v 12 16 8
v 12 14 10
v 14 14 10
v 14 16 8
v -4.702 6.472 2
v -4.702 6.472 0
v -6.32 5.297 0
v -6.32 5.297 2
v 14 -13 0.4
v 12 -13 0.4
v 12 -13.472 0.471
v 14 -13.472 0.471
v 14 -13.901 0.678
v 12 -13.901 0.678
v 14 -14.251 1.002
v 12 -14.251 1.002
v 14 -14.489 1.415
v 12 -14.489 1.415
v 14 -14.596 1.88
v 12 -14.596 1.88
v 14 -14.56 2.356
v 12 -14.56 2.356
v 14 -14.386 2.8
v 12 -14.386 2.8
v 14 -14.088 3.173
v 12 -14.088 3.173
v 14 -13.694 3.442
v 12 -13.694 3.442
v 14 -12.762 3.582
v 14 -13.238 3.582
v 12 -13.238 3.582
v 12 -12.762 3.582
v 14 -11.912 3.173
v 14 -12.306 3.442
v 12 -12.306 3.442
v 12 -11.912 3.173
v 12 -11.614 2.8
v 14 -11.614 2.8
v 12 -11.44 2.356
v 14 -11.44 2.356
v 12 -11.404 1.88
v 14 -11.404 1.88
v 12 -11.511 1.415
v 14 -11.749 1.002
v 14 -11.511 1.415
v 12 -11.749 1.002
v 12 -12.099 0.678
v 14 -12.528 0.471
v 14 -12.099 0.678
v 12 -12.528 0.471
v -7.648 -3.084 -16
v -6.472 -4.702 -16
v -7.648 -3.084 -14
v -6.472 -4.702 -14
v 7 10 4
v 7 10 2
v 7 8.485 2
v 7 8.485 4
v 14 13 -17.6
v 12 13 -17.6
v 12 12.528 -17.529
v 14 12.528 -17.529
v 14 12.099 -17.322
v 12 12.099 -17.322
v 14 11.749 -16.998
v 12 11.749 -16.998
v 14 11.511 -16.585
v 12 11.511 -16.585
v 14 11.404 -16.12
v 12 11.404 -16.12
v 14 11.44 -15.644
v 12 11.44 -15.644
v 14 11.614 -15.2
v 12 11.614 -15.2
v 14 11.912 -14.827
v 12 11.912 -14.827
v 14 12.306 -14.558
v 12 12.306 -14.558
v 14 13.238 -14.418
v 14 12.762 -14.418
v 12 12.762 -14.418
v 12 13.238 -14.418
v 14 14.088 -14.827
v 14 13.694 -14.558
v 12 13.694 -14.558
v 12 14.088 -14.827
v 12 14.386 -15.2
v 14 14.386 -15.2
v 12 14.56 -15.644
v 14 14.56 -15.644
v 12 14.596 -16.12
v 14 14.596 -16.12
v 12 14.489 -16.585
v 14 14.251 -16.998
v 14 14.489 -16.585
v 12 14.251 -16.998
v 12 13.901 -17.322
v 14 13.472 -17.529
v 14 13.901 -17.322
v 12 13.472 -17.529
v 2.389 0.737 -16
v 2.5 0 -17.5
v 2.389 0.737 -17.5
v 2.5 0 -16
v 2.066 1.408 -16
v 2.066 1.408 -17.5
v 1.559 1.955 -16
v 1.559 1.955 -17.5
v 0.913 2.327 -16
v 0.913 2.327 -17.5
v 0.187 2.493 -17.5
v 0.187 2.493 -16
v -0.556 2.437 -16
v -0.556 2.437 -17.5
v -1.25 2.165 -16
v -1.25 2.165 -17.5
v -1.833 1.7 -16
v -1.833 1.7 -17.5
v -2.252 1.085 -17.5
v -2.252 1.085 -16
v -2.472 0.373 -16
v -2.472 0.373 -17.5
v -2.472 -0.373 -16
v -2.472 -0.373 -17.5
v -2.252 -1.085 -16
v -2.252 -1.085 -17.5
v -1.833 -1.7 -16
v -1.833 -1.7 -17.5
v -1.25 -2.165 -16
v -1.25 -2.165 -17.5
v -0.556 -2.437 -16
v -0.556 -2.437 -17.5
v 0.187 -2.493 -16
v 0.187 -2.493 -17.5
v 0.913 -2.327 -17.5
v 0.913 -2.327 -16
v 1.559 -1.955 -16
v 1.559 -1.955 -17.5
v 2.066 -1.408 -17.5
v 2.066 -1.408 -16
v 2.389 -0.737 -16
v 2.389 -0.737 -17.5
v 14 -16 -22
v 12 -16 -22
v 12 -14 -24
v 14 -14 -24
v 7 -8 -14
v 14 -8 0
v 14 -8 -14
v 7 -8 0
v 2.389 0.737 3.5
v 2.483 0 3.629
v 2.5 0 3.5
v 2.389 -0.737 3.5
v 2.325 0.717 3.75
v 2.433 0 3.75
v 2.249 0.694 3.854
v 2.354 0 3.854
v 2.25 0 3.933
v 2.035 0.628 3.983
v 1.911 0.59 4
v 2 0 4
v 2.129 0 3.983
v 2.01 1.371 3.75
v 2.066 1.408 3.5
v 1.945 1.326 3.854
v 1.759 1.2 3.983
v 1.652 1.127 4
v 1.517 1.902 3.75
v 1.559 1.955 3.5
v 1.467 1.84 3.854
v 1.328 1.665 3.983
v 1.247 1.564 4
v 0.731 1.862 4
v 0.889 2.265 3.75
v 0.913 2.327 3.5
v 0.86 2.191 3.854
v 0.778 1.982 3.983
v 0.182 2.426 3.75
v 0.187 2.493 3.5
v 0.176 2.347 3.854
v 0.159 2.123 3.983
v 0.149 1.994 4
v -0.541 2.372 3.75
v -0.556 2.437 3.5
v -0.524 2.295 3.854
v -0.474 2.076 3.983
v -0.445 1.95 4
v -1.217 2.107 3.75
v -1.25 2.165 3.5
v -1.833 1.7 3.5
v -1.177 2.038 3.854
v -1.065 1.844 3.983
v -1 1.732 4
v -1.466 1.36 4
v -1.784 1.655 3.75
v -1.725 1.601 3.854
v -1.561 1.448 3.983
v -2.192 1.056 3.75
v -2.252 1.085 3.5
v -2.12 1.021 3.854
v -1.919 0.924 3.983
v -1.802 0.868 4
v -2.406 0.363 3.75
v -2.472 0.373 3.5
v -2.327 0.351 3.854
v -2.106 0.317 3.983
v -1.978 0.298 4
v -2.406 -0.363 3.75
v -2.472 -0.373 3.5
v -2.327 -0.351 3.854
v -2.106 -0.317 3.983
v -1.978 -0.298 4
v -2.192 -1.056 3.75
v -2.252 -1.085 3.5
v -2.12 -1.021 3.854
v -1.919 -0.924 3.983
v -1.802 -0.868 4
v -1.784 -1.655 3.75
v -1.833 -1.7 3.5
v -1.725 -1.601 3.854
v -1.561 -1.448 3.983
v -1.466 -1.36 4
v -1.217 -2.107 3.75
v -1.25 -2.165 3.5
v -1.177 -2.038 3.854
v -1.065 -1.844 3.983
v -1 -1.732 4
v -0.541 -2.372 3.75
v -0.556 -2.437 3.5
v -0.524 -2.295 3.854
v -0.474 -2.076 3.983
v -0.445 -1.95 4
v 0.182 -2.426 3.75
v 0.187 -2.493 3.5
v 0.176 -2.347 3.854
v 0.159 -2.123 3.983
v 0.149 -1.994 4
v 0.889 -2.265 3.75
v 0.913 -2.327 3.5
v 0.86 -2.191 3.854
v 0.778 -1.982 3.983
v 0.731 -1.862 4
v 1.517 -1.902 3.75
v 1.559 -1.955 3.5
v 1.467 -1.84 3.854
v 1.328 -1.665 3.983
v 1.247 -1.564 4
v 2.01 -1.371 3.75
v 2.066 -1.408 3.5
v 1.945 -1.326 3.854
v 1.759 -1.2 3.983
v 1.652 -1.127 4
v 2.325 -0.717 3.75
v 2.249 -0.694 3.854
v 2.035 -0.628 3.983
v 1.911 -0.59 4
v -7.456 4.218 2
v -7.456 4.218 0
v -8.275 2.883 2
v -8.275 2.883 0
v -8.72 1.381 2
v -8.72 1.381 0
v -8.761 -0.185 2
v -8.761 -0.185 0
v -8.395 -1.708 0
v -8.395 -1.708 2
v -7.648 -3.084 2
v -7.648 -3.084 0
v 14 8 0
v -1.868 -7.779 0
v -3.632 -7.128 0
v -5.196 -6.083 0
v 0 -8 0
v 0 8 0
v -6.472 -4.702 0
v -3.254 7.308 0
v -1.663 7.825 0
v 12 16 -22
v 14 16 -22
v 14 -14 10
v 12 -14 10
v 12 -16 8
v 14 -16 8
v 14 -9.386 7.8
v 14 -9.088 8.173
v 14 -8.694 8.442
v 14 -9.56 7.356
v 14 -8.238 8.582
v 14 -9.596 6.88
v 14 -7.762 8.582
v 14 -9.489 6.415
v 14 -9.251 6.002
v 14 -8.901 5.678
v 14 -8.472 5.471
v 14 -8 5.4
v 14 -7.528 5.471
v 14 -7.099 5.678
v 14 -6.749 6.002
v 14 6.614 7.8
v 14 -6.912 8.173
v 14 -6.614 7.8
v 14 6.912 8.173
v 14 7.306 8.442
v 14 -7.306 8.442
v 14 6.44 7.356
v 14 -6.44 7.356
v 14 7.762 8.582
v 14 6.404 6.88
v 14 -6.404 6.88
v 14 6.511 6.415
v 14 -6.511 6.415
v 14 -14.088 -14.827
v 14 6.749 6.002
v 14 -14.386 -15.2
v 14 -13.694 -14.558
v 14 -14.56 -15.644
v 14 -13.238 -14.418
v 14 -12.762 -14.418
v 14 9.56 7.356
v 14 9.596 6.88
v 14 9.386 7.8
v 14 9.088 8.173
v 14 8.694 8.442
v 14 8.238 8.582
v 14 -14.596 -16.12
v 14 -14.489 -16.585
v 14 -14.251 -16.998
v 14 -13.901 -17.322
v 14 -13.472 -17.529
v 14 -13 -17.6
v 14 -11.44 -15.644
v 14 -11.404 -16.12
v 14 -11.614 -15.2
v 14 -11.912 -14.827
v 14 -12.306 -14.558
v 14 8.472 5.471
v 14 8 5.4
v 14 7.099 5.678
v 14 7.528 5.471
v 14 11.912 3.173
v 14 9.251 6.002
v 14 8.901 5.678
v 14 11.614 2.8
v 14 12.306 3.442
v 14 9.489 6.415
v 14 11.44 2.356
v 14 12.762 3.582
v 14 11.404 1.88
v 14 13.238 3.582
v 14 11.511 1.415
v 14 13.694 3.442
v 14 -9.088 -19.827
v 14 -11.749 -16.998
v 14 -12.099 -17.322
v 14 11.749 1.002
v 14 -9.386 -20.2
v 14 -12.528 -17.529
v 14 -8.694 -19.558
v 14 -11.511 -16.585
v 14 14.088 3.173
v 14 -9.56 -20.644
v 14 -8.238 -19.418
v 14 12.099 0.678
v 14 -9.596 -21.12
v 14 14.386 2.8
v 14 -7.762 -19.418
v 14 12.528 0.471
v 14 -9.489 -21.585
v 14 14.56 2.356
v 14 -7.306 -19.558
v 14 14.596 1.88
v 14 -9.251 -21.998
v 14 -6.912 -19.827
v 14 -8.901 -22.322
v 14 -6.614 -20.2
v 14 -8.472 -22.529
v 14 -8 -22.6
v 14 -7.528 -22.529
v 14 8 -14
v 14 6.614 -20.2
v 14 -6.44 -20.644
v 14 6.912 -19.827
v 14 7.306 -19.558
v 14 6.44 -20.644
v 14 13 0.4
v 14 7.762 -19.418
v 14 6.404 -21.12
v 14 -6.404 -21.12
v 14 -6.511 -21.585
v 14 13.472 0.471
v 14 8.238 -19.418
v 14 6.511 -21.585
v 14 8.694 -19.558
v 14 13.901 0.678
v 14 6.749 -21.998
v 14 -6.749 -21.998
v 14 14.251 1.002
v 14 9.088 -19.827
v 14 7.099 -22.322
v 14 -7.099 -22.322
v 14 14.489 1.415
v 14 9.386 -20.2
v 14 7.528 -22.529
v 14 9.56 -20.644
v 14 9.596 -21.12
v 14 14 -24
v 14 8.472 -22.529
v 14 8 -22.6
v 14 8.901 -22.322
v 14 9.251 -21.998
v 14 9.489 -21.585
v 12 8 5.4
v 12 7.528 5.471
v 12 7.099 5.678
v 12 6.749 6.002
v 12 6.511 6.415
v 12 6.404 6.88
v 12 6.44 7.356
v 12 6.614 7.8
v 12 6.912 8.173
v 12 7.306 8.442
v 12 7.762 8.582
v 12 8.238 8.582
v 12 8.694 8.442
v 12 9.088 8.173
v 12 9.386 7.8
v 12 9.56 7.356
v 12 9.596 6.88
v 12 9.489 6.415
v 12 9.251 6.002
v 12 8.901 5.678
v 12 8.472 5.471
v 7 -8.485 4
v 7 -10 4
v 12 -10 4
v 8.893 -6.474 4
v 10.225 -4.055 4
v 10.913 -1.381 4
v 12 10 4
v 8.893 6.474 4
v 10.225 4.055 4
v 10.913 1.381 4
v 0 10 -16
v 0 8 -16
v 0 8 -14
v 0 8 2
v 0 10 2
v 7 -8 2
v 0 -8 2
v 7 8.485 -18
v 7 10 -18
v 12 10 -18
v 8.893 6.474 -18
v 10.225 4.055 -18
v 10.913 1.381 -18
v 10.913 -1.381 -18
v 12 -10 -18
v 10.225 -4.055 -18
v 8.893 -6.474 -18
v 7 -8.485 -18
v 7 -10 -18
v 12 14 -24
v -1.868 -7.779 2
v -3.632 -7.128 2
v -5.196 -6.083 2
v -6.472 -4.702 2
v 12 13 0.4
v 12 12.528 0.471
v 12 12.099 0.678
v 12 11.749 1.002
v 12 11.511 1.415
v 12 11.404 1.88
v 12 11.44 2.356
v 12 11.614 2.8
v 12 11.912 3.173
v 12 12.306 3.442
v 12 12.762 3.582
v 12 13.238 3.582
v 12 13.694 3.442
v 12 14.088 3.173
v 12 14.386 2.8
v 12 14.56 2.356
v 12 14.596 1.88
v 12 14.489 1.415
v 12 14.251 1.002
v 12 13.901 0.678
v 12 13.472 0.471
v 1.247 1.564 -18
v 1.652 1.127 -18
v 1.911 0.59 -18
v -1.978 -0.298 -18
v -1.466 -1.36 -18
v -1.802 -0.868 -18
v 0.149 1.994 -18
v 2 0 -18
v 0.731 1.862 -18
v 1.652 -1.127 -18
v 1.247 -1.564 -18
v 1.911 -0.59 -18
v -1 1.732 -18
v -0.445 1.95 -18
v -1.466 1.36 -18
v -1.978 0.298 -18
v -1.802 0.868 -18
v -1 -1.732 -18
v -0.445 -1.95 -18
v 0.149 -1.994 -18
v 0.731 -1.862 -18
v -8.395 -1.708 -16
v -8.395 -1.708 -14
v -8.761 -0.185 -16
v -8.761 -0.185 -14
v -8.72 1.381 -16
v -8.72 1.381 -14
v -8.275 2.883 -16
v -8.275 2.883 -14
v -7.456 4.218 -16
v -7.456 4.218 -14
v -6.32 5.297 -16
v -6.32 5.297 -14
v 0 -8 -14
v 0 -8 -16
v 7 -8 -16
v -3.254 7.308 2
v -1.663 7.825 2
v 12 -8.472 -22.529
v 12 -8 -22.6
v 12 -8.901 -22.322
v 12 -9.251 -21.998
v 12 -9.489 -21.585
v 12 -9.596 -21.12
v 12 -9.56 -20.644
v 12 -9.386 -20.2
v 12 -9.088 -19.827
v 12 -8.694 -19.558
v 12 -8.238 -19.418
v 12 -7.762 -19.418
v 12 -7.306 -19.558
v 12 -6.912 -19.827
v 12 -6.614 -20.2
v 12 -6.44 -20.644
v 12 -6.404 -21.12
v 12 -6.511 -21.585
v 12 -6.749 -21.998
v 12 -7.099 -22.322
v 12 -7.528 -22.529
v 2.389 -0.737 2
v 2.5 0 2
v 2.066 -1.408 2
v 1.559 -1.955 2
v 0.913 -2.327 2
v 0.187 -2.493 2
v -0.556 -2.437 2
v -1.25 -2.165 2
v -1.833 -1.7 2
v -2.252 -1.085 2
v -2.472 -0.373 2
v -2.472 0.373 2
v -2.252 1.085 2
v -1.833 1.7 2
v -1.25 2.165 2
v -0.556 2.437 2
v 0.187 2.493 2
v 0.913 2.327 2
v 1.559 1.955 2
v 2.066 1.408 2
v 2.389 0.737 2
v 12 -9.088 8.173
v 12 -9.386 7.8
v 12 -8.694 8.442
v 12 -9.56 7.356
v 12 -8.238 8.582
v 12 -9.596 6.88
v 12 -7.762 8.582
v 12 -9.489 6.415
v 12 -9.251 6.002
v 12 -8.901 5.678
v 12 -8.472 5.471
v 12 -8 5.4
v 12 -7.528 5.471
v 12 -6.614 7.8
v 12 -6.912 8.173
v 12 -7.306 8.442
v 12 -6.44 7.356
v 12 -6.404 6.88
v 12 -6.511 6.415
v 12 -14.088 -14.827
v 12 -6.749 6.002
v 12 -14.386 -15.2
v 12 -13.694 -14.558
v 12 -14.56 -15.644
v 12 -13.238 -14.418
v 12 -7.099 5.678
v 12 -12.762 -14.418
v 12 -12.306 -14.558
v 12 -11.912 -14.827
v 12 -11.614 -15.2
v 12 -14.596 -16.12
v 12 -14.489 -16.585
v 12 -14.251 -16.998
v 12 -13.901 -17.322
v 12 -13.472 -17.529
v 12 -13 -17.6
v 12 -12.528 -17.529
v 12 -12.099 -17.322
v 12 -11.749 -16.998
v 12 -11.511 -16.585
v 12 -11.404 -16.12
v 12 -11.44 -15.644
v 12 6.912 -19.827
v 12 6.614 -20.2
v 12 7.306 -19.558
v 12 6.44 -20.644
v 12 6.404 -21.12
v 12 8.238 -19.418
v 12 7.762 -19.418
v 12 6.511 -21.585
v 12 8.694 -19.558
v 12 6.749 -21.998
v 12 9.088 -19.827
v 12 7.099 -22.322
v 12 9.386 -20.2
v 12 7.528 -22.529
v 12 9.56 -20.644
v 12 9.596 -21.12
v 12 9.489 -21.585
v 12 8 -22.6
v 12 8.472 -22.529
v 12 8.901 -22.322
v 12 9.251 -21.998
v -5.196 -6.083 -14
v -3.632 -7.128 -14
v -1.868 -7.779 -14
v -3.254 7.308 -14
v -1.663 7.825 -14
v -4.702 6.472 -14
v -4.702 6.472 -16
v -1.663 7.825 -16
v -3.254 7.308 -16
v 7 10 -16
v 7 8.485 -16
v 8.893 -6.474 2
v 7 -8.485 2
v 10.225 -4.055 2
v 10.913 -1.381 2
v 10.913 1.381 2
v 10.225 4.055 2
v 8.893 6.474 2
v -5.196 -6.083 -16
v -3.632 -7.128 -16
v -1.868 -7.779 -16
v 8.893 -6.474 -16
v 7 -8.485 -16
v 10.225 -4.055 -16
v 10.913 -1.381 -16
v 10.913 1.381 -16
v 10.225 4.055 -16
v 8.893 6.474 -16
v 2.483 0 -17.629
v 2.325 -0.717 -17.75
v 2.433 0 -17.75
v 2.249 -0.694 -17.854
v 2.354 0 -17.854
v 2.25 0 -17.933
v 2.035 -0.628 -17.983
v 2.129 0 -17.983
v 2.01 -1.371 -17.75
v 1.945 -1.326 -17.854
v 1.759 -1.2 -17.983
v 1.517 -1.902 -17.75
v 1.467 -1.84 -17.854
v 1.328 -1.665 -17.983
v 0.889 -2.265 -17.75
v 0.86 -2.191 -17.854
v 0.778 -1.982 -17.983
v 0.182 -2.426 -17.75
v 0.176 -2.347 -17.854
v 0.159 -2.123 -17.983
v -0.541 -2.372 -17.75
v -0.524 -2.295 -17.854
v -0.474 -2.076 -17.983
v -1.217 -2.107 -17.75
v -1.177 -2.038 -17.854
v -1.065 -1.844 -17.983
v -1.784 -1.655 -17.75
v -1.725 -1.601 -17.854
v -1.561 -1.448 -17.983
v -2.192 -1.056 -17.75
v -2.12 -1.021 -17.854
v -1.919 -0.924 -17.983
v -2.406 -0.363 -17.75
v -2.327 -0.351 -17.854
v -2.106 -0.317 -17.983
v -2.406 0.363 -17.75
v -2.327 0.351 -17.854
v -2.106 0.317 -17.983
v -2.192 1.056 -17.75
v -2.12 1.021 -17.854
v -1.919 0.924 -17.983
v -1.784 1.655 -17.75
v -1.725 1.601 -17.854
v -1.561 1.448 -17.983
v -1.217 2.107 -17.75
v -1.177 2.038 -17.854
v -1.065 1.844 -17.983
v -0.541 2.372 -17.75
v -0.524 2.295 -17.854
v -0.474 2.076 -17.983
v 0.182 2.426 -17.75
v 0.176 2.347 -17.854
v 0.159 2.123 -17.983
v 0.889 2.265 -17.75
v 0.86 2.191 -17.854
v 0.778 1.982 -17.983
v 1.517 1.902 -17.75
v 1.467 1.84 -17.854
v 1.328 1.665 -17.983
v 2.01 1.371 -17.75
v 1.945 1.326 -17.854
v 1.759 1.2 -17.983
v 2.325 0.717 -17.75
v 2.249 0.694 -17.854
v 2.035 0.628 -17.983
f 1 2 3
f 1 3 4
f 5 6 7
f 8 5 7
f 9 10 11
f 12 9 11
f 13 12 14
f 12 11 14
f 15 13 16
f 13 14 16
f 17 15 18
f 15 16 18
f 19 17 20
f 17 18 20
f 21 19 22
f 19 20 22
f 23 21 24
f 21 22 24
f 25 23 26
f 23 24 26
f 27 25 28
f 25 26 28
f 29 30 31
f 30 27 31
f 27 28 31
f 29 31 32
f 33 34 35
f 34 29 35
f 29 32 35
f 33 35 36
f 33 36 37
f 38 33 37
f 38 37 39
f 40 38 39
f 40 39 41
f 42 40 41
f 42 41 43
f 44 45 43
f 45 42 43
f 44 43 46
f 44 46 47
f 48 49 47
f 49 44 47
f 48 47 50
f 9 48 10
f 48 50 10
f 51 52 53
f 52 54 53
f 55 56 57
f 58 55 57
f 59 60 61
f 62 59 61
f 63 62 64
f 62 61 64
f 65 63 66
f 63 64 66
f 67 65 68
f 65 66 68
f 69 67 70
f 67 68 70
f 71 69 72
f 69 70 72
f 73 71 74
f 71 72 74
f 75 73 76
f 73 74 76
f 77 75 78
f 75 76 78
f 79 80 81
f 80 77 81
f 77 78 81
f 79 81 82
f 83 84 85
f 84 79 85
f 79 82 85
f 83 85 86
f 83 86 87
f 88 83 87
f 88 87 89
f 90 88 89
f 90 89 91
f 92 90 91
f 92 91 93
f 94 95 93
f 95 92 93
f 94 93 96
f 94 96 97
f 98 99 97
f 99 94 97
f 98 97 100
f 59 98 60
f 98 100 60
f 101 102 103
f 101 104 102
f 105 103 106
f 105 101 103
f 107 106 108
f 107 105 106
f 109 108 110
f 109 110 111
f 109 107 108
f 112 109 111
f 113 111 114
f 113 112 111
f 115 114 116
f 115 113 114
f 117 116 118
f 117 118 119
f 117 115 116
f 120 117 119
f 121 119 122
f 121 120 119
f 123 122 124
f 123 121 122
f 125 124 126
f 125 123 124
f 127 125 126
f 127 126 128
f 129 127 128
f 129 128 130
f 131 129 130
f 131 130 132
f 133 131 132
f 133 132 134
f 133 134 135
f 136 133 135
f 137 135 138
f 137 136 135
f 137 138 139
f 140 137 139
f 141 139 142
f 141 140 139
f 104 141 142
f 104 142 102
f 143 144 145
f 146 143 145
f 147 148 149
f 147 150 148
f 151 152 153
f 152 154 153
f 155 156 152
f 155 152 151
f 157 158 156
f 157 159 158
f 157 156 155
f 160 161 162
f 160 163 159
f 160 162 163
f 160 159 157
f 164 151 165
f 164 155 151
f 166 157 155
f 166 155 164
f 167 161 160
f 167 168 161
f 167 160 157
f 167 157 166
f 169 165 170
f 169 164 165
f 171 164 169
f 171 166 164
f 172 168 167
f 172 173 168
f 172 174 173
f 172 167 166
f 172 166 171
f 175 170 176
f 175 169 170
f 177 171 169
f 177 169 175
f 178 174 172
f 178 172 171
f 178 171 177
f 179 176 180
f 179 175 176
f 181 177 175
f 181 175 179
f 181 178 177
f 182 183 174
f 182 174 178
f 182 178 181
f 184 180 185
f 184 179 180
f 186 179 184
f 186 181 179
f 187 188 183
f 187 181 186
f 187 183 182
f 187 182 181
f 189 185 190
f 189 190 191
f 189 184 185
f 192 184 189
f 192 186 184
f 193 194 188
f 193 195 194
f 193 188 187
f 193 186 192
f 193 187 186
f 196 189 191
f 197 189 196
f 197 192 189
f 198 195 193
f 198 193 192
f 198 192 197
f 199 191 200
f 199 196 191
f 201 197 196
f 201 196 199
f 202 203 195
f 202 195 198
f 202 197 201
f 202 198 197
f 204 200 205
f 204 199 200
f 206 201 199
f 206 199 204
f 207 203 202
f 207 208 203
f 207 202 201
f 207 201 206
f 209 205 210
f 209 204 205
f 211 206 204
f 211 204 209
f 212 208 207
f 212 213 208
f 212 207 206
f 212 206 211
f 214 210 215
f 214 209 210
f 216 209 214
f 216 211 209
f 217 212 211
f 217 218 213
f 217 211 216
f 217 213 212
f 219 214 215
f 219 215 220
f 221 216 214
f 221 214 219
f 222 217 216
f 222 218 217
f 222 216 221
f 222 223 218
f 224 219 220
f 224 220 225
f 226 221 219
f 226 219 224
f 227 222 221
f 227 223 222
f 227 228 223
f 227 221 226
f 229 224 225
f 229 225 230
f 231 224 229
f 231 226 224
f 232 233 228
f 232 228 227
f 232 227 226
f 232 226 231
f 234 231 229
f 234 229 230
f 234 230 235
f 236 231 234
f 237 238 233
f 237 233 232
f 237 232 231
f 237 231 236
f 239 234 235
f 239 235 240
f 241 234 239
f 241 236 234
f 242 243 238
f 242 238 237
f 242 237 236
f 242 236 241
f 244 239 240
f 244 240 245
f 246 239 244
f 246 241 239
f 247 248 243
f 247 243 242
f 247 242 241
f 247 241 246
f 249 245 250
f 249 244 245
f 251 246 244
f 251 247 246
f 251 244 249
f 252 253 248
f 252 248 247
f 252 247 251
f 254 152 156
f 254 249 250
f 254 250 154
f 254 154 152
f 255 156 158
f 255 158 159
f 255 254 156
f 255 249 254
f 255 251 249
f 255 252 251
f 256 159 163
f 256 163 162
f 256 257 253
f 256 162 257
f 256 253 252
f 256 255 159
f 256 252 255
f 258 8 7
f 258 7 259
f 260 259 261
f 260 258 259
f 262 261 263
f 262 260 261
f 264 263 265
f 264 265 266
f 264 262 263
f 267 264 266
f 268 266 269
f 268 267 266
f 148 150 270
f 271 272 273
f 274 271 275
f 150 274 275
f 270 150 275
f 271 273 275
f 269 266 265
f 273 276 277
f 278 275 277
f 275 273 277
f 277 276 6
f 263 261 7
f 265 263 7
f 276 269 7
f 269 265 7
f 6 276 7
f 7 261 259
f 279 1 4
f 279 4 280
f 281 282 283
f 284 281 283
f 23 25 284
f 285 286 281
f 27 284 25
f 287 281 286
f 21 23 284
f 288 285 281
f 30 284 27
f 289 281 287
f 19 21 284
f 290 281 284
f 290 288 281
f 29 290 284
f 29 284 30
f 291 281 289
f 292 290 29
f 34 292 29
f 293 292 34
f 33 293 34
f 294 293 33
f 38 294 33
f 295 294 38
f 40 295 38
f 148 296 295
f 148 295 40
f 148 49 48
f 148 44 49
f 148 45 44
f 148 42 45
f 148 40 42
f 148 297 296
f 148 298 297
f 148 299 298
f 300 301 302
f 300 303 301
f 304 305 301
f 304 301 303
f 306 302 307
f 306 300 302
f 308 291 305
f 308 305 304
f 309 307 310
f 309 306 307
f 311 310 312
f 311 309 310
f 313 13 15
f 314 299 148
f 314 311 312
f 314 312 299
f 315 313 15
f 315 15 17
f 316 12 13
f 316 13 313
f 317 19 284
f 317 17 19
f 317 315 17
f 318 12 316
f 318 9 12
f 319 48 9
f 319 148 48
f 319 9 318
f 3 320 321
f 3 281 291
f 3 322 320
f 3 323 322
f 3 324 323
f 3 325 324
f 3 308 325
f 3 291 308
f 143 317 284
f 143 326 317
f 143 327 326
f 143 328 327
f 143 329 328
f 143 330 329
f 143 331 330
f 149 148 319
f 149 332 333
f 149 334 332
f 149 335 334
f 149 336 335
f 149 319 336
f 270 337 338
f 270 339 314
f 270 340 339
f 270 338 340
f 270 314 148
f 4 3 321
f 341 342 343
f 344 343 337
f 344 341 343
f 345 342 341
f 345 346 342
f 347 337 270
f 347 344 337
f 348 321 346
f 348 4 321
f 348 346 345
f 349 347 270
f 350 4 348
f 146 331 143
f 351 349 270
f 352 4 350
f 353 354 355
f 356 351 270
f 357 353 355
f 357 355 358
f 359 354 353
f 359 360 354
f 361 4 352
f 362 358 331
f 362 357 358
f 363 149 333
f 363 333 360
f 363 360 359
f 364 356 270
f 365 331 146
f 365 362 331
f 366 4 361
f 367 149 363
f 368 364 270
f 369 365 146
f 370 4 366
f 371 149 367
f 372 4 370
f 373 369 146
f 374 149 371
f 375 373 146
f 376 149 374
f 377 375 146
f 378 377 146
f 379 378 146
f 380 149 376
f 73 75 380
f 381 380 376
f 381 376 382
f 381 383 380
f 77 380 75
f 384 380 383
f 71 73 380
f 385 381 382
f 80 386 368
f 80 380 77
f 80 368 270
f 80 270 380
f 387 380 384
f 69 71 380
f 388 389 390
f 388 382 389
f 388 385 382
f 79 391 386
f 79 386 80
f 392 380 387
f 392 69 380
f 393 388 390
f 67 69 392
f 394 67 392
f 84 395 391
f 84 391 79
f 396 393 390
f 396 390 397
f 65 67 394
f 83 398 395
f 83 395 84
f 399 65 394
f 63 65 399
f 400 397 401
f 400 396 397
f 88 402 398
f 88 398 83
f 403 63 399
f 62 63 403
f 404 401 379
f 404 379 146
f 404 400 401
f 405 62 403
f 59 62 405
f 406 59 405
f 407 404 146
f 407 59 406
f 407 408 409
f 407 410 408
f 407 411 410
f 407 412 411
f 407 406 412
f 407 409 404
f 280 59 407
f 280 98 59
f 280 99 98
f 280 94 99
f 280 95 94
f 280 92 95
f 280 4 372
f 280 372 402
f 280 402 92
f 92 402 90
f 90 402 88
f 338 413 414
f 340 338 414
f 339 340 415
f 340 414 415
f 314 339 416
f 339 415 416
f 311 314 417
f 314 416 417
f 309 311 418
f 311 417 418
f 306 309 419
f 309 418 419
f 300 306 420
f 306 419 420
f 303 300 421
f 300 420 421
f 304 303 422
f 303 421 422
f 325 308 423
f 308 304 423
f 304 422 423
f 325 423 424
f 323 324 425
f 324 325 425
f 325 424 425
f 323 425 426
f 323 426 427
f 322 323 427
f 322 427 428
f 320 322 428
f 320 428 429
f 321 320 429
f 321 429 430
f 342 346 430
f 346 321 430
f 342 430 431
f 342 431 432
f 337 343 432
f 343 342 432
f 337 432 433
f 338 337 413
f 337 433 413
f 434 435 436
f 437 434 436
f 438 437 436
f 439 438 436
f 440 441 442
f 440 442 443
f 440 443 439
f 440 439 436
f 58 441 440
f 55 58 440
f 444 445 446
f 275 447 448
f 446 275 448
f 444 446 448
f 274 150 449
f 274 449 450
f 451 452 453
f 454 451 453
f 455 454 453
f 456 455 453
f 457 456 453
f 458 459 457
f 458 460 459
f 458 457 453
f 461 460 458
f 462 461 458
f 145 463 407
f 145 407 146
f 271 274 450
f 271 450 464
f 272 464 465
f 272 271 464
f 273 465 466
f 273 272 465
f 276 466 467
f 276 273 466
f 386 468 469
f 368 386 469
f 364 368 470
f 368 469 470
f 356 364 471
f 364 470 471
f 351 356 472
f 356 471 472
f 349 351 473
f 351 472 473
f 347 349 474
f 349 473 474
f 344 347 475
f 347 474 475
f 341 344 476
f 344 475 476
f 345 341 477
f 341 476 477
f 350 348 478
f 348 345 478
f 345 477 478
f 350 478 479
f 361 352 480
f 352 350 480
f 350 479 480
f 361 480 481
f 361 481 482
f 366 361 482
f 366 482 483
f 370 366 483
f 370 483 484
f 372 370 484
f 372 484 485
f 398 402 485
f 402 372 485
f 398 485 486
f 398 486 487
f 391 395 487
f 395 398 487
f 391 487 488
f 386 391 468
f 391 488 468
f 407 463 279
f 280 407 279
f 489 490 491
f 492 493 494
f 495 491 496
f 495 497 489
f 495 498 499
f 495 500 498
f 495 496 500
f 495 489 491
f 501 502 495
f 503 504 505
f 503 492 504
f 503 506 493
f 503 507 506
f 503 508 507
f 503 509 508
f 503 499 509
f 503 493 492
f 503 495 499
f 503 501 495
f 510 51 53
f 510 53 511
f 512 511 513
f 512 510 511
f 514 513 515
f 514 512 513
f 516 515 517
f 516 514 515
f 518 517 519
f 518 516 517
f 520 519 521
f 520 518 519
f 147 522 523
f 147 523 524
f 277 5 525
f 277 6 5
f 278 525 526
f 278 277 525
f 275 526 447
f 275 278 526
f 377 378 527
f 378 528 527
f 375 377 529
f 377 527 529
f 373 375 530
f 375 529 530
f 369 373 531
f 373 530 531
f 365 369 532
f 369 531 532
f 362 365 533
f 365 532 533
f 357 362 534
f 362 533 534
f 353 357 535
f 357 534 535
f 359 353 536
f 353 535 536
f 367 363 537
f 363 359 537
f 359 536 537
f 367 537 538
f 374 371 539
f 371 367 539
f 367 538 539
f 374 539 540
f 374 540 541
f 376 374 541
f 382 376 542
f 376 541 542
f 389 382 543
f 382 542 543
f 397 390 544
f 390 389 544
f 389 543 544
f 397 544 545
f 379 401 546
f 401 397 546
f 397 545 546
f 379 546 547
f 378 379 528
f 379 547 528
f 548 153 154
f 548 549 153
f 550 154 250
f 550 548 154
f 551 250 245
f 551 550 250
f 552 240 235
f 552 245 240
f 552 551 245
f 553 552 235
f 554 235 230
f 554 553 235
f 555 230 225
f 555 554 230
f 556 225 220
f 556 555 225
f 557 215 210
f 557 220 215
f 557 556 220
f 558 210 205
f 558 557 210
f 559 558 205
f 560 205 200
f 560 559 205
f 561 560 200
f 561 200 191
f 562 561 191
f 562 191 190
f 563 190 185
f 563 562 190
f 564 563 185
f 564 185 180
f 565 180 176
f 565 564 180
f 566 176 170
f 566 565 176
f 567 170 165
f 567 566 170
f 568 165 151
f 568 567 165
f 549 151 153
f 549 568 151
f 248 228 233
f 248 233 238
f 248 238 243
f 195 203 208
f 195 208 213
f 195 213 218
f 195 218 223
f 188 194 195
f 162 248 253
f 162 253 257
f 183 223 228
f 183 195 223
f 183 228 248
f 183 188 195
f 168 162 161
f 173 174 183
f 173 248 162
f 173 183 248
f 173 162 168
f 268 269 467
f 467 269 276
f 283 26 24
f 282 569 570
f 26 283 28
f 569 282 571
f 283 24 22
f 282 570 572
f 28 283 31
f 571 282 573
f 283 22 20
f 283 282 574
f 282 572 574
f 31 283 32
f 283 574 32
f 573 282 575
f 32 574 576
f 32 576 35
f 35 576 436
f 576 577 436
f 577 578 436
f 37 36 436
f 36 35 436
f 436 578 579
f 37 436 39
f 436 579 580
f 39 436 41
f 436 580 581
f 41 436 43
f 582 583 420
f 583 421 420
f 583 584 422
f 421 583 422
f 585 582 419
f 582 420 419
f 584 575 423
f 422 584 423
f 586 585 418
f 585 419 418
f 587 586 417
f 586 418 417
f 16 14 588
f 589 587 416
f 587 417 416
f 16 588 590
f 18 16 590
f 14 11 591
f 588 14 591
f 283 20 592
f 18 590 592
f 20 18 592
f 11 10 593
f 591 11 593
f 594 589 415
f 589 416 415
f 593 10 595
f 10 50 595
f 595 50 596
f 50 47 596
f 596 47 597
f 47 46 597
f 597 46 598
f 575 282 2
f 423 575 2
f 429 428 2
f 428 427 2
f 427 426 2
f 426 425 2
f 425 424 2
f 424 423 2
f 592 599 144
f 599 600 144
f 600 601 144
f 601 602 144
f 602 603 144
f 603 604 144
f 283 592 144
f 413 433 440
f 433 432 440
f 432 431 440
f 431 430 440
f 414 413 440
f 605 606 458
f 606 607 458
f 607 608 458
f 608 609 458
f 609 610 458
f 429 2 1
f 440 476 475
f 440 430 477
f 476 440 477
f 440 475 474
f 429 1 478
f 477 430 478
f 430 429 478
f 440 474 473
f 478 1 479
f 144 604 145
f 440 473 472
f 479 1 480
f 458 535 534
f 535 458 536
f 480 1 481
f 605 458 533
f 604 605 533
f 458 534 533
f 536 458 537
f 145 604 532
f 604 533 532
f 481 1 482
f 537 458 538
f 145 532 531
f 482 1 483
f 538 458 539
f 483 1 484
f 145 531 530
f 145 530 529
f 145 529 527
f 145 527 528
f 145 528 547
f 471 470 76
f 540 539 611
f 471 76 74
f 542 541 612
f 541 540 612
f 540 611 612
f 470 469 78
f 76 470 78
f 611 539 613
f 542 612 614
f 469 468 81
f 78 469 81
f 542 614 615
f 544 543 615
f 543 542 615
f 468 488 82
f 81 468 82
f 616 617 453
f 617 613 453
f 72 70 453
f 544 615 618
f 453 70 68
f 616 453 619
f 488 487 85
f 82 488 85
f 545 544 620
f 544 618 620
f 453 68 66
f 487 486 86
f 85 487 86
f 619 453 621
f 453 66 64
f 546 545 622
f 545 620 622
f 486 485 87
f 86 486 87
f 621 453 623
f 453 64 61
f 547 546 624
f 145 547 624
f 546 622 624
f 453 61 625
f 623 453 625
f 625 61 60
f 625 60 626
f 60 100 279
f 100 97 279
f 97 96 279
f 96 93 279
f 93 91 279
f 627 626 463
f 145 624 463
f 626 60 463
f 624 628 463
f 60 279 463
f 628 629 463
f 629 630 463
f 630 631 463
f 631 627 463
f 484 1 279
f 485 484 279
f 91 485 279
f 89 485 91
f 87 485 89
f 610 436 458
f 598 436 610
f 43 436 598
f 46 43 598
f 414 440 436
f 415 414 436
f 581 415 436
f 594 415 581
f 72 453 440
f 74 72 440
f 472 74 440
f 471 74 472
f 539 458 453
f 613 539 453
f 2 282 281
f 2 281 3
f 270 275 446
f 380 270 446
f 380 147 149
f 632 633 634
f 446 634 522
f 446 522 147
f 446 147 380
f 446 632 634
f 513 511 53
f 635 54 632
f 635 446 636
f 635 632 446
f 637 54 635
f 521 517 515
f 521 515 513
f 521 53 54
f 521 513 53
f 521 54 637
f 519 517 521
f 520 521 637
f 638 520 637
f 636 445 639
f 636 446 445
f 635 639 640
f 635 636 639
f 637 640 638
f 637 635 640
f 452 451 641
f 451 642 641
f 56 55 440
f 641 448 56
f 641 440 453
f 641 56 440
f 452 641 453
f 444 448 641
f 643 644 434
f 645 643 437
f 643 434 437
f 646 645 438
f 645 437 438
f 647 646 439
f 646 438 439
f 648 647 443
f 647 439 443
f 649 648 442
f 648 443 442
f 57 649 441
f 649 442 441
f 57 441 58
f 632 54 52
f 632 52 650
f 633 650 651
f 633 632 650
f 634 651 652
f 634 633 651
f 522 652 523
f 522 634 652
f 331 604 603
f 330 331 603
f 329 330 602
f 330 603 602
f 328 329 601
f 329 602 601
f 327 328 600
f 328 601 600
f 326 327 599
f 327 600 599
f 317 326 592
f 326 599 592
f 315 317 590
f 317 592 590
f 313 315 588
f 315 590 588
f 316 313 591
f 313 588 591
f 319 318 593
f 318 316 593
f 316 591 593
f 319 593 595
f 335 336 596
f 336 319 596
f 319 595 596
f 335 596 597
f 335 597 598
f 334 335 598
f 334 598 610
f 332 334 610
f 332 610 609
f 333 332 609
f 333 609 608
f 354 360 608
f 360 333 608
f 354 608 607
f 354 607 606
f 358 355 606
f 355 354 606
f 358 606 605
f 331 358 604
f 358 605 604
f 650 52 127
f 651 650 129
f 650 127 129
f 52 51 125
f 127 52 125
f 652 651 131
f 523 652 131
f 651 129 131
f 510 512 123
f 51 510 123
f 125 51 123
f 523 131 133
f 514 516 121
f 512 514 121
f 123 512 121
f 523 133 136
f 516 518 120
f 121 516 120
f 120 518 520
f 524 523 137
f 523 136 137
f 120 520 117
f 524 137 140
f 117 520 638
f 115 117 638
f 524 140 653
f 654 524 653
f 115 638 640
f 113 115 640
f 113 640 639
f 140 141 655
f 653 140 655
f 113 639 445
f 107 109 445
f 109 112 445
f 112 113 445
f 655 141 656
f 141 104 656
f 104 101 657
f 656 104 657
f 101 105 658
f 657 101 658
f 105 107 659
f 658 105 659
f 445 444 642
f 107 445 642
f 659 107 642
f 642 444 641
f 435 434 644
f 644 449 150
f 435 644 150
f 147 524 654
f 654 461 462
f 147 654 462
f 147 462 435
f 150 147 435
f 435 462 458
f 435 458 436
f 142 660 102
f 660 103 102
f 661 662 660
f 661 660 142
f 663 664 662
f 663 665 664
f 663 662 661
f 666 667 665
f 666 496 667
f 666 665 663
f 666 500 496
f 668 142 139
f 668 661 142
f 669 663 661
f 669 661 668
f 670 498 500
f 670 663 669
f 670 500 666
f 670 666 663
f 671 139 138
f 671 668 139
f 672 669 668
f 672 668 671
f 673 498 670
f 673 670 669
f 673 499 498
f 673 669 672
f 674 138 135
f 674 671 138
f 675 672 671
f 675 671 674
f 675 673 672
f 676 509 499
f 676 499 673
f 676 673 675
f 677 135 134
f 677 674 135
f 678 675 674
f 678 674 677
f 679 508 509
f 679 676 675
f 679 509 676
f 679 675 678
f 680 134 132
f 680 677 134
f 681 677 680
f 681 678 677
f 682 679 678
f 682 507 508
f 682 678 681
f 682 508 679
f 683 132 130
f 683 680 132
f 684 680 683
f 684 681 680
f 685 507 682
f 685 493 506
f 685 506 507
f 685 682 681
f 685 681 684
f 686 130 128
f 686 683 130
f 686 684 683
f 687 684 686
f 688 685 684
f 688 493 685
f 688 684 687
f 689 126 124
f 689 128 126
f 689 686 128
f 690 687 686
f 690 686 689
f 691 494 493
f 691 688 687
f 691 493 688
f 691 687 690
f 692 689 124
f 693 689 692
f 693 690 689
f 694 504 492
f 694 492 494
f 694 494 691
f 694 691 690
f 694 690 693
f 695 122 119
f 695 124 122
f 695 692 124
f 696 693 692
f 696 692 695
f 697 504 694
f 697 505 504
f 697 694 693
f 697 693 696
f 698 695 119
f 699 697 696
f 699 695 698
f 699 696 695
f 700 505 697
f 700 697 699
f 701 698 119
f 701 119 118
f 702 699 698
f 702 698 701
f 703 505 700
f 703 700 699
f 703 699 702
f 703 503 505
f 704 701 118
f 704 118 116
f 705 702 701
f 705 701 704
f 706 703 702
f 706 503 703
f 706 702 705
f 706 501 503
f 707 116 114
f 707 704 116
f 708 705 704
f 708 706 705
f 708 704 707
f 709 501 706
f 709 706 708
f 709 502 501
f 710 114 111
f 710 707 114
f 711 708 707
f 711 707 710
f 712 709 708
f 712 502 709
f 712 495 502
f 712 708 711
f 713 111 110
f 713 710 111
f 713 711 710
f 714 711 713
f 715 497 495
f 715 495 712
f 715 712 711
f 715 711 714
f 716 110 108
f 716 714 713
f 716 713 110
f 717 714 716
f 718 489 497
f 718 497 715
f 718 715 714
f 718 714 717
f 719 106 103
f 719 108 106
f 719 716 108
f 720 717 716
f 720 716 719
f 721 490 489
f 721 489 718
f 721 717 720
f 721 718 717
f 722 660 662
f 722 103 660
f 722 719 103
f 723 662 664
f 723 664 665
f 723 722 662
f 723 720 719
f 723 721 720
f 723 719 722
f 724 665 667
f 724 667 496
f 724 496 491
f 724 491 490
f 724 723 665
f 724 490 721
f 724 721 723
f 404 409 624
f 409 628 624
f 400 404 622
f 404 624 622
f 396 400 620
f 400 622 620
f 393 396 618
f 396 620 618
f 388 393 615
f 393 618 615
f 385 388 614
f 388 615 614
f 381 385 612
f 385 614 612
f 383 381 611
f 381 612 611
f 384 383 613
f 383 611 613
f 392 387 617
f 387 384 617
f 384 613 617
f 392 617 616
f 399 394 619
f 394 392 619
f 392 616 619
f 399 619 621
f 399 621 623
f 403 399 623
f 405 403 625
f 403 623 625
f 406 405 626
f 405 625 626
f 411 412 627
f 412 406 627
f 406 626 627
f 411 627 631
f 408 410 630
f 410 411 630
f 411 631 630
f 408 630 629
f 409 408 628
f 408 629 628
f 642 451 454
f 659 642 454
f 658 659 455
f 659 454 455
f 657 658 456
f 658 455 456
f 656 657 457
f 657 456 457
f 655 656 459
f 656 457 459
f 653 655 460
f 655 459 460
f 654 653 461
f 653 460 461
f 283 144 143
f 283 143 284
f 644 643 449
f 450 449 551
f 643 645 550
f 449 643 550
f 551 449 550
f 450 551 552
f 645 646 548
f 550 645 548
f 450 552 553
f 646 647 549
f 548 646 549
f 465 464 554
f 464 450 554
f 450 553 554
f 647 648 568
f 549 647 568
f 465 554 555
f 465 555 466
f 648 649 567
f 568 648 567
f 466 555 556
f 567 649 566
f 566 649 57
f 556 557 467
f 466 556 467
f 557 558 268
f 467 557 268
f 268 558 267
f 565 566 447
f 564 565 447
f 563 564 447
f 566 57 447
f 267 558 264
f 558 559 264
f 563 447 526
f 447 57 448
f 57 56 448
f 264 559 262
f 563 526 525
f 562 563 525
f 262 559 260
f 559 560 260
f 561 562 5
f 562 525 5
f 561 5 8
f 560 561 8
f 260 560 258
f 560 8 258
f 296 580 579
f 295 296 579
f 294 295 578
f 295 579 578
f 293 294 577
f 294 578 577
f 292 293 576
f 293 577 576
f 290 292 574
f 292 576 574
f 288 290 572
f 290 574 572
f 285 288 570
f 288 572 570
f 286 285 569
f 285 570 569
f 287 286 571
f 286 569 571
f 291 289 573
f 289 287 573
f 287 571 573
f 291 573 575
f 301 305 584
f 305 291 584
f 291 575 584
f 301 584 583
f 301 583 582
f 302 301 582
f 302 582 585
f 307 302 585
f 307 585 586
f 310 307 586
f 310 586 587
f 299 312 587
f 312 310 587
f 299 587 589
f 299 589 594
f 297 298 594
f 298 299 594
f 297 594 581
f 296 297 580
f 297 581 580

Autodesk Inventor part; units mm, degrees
ref_plane "YZ Plane" through (0, 0, 0) normal (1, 0, 0) x (0, 1, 0)
sketch "Sketch1" plane through (0, 0, 0) normal (0, 0, 1) x (1, 0, 0)
  circle A0 centre (0, 0) radius 2.5
  circle A1 centre (20, 0) radius 2.5
  line L0 (7, 10) -> (20, 10)
  line L1 (7, -10) -> (20, -10)
  arc A2 (20, -10) -> (20, 10) centre (20, 0) ccw
  line L2 (7, 10) -> (7, 8)
  line L3 (7, -10) -> (7, -8)
  line L4 (7, 8) -> (0, 8)
  line L5 (7, -8) -> (0, -8)
  arc A3 (0, 8) -> (0, -8) centre (0, 0) ccw
  dimension "d0" = 5
  dimension "d1" = 20
  dimension "d2" = 10
  dimension "d3" = 2
  dimension "d4" = 13
extrude "Extrusion1" add sketch "Sketch1" along normal blind 4
sketch "Sketch2" plane through (0, 0, 4) normal (0, 0, 1) x (1, 0, 0)
  circle A0 centre (0, 0) radius 2.5 projected
  line L0 (7, 8) -> (0, 8) projected
  arc A1 (0, 8) -> (0, -8) centre (0, 0) ccw projected
  line L1 (0, -8) -> (7, -8) projected
  line L2 (7, -10) -> (20, -10) projected
  line L3 (7, 8) -> (7, -8)
  line L4 (7, -8) -> (0, -8)
  line L5 (7, 8) -> (0, 8)
  arc A2 (0, 8) -> (0, -8) centre (0, 0) ccw
extrude "Extrusion2" cut sketch "Sketch2" against normal blind 2
sketch "Sketch3" plane through (0, 0, 0) normal (0, 0, -1) x (-1, 0, 0)
  circle A0 centre (-20, 0) radius 2.5 projected
  circle A1 centre (0, 0) radius 2.5 projected
  line L0 (-7, 10) -> (-20, 10) projected
  arc A2 (-20, 10) -> (-20, -10) centre (-20, 0) ccw projected
  line L1 (-20, -10) -> (-7, -10) projected
  line L2 (-7, 8) -> (-7, 10) projected
  line L3 (-19, 10) -> (-19, 8)
  line L4 (-19, 8) -> (-11, 8)
  line L5 (-11, 8) -> (-11, -8)
  line L6 (-11, -8) -> (-19, -8)
  line L7 (-19, -8) -> (-19, -10)
  point P0 (-7, -8)
  dimension "d9" = 1
  dimension "d10" = 11
extrude "Extrusion3" cut sketch "Sketch3" against normal blind 2 contours L3 L4 L5 L6 L7 L1 A2 L0
sketch "Sketch4" plane through (0, 0, 4) normal (0, 0, 1) x (1, 0, 0)
  line L0 (7, 10) -> (7, -10)
  circle A0 centre (0, 0) radius 2.5
  arc A1 (7, -8.485281) -> (7, 8.485281) centre (0, 0) ccw
  dimension "d15" = 11
extrude "Extrusion4" cut sketch "Sketch4" against normal blind 2 contours A1 L0
sketch "Sketch5" plane through (0, 0, 0) normal (0, 0, -1) x (-1, 0, 0)
  line L0 (0, 8) -> (-7, 8) projected
  line L1 (-7, 10) -> (0, 10)
  line L2 (0, 10) -> (0, 8)
  line L3 (0, 8) -> (-7, 8)
  line L4 (-7, 8) -> (-7, 10)
  arc A0 (0, -8) -> (0, 8) centre (0, 0) ccw projected
extrude "Extrusion5" add sketch "Sketch5" against normal blind 2
sketch "Sketch6" plane through (0, 0, 0) normal (0, 0, -1) x (-1, 0, 0)
  line L0 (0, 10) -> (-19, 10) projected
  line L1 (-19, 8) -> (-20, 8)
  line L2 (-20, 8) -> (-20, 10)
  line L3 (-20, 10) -> (-19, 10)
  line L4 (-19, 10) -> (-19, 8)
  circle A0 centre (-20, 0) radius 2.5 projected
extrude "Extrusion6" add sketch "Sketch6" against normal blind 2 contours L1 L2 L3 L4
sketch "Sketch7" plane through (0, 0, 0) normal (0, 0, -1) x (-1, 0, 0)
  line L0 (-19, -8) -> (-19, -10)
  line L1 (-11, -8) -> (-19, -8)
  line L2 (-17.400642, -8) -> (-19, -9.162001)
  line L3 (-17.400642, -8) -> (-26.805206, 4.944272) construction
  line L4 (-26.805206, 4.944272) -> (-28.404564, 3.782271) construction
  line L5 (-28.404564, 3.782271) -> (-19, -9.162001) construction
  circle A0 centre (-20, 0) radius 2.5
  line L6 (-17.400642, -8) -> (-19, -8)
  line L7 (-19, -8) -> (-19, -9.162001)
  dimension "d21" = 16
  dimension "d22" = 8
  dimension "d23" = 36
extrude "Extrusion7" cut sketch "Sketch7" against normal blind 2 contours L1 L2 L0
sketch "Sketch9" plane through (0, 0, 2) normal (0, 0, 1) x (1, 0, 0)
  circle A0 centre (0, 0) radius 2.5
  arc A1 (11, 0) -> (7, 8.485281) centre (0, 0) ccw
  circle A2 centre (0, 0) radius 2.5
extrude "Extrusion8" add sketch "Sketch9" along normal mid plane 4
fillet "Fillet1" radius 0.5 1 edges at (-2.5, 0, 4)
sketch "Sketch10" plane through (0, 0, 0) normal (0, 0, -1) x (-1, 0, 0)
  arc A0 (0, -8) -> (0, 8) centre (0, 0) ccw
  line L0 (0, 10) -> (-20, 10)
  line L1 (4.702282, 6.472136) -> (11.174418, 1.769854)
  line L2 (11.174418, 1.769854) -> (6.472136, -4.702282)
  dimension "d30" = 144
extrude "Extrusion9" add sketch "Sketch10" against normal blind 2
fillet "Fillet2" radius 6 1 edges at (-11.1744, 1.7699, 1)
ref_plane "Work Plane1" through (11, 0, 4) normal (1, 0, 0) x (0, 1, 0)
split "Split1" plane through (11, 0, 4) removes the side toward (1, 0, 0)
sketch "Sketch11" plane through (11, -10, 0) normal (1, 0, 0) x (0, 0, -1)
  line L0 (0, 20) -> (0, 0) projected
  line L1 (-4, 20) -> (0, 20) projected
  line L2 (-4, 10) -> (-4, 20) projected
  line L3 (-4, 0) -> (-4, 10) projected
  line L4 (0, 0) -> (-4, 0) projected
  point P0 (0, 10)
extrude "Extrusion10" add sketch "Sketch11" along normal blind 1
ref_plane "Work Plane2" through (0, 0, -7) normal (0, 0, -1) x (-1, 0, 0)
mirror "Mirror1" about plane through (0, 0, -7) normal (0, 0, -1)
sketch "Sketch12" plane through (0, 0, 0) normal (0, 0, -1) x (-1, 0, 0)
  line L0 (-12, -10) -> (-7, -10)
  line L1 (-7, -10) -> (-7, -8)
  arc A0 (4.702282, 6.472136) -> (0, 8) centre (0, 0) ccw
  line L2 (0, 8) -> (0, 10)
  line L3 (0, 10) -> (-12, 10)
  line L4 (-12, -10) -> (-12, 10)
  line L5 (0, 8) -> (-12, 8)
  line L6 (-7, -8) -> (-12, -8)
extrude "Extrusion11" add sketch "Sketch12" along normal blind 14
sketch "Sketch17" plane through (12, -10, 0) normal (1, 0, 0) x (0, 0, -1)
  line L0 (0, 2) -> (0, 18) projected
  line L1 (0, 18) -> (14, 18) projected
  line L2 (14, 2) -> (14, 18) projected
  line L3 (0, 2) -> (14, 2) projected
  line L4 (18, 20) -> (18, 0) projected
  line L5 (-4, 20) -> (18, 20) projected
  line L6 (-4, 20) -> (-4, 0) projected
  line L7 (-8, 26) -> (22, 26)
  line L8 (24, 24) -> (24, -4)
  line L9 (22, -6) -> (-8, -6)
  line L10 (-10, -4) -> (-10, 24)
  line L11 (-7, 23) -> (21, 23) construction
  line L12 (21, 23) -> (21, -3) construction
  line L13 (21, -3) -> (-7, -3) construction
  line L14 (-7, -3) -> (-7, 23) construction
  circle A0 centre (-2, -3) radius 1.6
  circle A1 centre (16, -3) radius 1.6
  circle A2 centre (21, 2) radius 1.6
  circle A3 centre (21, 18) radius 1.6
  circle A4 centre (16, 23) radius 1.6
  circle A5 centre (-2, 23) radius 1.6
  circle A6 centre (-7, 18) radius 1.6
  circle A7 centre (-7, 2) radius 1.6
  line L15 (-10, 24) -> (-8, 26)
  line L16 (-10, -4) -> (-8, -6)
  line L17 (22, -6) -> (24, -4)
  line L18 (24, 24) -> (22, 26)
  point P0 (0, 10)
  point P1 (-10, 26)
  point P2 (24, -6)
  point P3 (24, 26)
  point P4 (-10, -6)
  point P5 (-7, 10)
  point P6 (-4, 10)
  point P7 (7, 23)
  point P8 (7, 20)
  point P9 (24, 10)
  point P10 (21, 10)
  point P11 (7, -6)
  point P12 (7, -3)
  dimension "d73" = 3.2
  dimension "d74" = 5
  dimension "d75" = 5
  dimension "d76" = 5
  dimension "d77" = 5
  dimension "d78" = 5
  dimension "d79" = 5
  dimension "d80" = 5
  dimension "d81" = 5
  dimension "d82" = 3
  dimension "d83" = 3
  dimension "d84" = 2
  dimension "d85" = 2
  dimension "d86" = 2
  dimension "d87" = 2
  dimension "d88" = 2
  dimension "d89" = 2
  dimension "d90" = 2
  dimension "d91" = 2
  dimension "d92" = 3
  dimension "d93" = 3
extrude "Extrusion16" add sketch "Sketch17" along normal blind 2
equation "\"d75\" = d74"
equation "\"d76\" = d75"
equation "\"d77\" = d76"
equation "\"d78\" = d76"
equation "\"d79\" = d75"
equation "\"d80\" = d75"
equation "\"d81\" = d75"
equation "\"d85\" = d84"
equation "\"d86\" = d84"
equation "\"d87\" = d86"
equation "\"d88\" = d84"
equation "\"d89\" = d88"
equation "\"d90\" = d84"
equation "\"d91\" = d90"
properties part number "z_axis_cable_mount_b" material "ABS Plastic"
